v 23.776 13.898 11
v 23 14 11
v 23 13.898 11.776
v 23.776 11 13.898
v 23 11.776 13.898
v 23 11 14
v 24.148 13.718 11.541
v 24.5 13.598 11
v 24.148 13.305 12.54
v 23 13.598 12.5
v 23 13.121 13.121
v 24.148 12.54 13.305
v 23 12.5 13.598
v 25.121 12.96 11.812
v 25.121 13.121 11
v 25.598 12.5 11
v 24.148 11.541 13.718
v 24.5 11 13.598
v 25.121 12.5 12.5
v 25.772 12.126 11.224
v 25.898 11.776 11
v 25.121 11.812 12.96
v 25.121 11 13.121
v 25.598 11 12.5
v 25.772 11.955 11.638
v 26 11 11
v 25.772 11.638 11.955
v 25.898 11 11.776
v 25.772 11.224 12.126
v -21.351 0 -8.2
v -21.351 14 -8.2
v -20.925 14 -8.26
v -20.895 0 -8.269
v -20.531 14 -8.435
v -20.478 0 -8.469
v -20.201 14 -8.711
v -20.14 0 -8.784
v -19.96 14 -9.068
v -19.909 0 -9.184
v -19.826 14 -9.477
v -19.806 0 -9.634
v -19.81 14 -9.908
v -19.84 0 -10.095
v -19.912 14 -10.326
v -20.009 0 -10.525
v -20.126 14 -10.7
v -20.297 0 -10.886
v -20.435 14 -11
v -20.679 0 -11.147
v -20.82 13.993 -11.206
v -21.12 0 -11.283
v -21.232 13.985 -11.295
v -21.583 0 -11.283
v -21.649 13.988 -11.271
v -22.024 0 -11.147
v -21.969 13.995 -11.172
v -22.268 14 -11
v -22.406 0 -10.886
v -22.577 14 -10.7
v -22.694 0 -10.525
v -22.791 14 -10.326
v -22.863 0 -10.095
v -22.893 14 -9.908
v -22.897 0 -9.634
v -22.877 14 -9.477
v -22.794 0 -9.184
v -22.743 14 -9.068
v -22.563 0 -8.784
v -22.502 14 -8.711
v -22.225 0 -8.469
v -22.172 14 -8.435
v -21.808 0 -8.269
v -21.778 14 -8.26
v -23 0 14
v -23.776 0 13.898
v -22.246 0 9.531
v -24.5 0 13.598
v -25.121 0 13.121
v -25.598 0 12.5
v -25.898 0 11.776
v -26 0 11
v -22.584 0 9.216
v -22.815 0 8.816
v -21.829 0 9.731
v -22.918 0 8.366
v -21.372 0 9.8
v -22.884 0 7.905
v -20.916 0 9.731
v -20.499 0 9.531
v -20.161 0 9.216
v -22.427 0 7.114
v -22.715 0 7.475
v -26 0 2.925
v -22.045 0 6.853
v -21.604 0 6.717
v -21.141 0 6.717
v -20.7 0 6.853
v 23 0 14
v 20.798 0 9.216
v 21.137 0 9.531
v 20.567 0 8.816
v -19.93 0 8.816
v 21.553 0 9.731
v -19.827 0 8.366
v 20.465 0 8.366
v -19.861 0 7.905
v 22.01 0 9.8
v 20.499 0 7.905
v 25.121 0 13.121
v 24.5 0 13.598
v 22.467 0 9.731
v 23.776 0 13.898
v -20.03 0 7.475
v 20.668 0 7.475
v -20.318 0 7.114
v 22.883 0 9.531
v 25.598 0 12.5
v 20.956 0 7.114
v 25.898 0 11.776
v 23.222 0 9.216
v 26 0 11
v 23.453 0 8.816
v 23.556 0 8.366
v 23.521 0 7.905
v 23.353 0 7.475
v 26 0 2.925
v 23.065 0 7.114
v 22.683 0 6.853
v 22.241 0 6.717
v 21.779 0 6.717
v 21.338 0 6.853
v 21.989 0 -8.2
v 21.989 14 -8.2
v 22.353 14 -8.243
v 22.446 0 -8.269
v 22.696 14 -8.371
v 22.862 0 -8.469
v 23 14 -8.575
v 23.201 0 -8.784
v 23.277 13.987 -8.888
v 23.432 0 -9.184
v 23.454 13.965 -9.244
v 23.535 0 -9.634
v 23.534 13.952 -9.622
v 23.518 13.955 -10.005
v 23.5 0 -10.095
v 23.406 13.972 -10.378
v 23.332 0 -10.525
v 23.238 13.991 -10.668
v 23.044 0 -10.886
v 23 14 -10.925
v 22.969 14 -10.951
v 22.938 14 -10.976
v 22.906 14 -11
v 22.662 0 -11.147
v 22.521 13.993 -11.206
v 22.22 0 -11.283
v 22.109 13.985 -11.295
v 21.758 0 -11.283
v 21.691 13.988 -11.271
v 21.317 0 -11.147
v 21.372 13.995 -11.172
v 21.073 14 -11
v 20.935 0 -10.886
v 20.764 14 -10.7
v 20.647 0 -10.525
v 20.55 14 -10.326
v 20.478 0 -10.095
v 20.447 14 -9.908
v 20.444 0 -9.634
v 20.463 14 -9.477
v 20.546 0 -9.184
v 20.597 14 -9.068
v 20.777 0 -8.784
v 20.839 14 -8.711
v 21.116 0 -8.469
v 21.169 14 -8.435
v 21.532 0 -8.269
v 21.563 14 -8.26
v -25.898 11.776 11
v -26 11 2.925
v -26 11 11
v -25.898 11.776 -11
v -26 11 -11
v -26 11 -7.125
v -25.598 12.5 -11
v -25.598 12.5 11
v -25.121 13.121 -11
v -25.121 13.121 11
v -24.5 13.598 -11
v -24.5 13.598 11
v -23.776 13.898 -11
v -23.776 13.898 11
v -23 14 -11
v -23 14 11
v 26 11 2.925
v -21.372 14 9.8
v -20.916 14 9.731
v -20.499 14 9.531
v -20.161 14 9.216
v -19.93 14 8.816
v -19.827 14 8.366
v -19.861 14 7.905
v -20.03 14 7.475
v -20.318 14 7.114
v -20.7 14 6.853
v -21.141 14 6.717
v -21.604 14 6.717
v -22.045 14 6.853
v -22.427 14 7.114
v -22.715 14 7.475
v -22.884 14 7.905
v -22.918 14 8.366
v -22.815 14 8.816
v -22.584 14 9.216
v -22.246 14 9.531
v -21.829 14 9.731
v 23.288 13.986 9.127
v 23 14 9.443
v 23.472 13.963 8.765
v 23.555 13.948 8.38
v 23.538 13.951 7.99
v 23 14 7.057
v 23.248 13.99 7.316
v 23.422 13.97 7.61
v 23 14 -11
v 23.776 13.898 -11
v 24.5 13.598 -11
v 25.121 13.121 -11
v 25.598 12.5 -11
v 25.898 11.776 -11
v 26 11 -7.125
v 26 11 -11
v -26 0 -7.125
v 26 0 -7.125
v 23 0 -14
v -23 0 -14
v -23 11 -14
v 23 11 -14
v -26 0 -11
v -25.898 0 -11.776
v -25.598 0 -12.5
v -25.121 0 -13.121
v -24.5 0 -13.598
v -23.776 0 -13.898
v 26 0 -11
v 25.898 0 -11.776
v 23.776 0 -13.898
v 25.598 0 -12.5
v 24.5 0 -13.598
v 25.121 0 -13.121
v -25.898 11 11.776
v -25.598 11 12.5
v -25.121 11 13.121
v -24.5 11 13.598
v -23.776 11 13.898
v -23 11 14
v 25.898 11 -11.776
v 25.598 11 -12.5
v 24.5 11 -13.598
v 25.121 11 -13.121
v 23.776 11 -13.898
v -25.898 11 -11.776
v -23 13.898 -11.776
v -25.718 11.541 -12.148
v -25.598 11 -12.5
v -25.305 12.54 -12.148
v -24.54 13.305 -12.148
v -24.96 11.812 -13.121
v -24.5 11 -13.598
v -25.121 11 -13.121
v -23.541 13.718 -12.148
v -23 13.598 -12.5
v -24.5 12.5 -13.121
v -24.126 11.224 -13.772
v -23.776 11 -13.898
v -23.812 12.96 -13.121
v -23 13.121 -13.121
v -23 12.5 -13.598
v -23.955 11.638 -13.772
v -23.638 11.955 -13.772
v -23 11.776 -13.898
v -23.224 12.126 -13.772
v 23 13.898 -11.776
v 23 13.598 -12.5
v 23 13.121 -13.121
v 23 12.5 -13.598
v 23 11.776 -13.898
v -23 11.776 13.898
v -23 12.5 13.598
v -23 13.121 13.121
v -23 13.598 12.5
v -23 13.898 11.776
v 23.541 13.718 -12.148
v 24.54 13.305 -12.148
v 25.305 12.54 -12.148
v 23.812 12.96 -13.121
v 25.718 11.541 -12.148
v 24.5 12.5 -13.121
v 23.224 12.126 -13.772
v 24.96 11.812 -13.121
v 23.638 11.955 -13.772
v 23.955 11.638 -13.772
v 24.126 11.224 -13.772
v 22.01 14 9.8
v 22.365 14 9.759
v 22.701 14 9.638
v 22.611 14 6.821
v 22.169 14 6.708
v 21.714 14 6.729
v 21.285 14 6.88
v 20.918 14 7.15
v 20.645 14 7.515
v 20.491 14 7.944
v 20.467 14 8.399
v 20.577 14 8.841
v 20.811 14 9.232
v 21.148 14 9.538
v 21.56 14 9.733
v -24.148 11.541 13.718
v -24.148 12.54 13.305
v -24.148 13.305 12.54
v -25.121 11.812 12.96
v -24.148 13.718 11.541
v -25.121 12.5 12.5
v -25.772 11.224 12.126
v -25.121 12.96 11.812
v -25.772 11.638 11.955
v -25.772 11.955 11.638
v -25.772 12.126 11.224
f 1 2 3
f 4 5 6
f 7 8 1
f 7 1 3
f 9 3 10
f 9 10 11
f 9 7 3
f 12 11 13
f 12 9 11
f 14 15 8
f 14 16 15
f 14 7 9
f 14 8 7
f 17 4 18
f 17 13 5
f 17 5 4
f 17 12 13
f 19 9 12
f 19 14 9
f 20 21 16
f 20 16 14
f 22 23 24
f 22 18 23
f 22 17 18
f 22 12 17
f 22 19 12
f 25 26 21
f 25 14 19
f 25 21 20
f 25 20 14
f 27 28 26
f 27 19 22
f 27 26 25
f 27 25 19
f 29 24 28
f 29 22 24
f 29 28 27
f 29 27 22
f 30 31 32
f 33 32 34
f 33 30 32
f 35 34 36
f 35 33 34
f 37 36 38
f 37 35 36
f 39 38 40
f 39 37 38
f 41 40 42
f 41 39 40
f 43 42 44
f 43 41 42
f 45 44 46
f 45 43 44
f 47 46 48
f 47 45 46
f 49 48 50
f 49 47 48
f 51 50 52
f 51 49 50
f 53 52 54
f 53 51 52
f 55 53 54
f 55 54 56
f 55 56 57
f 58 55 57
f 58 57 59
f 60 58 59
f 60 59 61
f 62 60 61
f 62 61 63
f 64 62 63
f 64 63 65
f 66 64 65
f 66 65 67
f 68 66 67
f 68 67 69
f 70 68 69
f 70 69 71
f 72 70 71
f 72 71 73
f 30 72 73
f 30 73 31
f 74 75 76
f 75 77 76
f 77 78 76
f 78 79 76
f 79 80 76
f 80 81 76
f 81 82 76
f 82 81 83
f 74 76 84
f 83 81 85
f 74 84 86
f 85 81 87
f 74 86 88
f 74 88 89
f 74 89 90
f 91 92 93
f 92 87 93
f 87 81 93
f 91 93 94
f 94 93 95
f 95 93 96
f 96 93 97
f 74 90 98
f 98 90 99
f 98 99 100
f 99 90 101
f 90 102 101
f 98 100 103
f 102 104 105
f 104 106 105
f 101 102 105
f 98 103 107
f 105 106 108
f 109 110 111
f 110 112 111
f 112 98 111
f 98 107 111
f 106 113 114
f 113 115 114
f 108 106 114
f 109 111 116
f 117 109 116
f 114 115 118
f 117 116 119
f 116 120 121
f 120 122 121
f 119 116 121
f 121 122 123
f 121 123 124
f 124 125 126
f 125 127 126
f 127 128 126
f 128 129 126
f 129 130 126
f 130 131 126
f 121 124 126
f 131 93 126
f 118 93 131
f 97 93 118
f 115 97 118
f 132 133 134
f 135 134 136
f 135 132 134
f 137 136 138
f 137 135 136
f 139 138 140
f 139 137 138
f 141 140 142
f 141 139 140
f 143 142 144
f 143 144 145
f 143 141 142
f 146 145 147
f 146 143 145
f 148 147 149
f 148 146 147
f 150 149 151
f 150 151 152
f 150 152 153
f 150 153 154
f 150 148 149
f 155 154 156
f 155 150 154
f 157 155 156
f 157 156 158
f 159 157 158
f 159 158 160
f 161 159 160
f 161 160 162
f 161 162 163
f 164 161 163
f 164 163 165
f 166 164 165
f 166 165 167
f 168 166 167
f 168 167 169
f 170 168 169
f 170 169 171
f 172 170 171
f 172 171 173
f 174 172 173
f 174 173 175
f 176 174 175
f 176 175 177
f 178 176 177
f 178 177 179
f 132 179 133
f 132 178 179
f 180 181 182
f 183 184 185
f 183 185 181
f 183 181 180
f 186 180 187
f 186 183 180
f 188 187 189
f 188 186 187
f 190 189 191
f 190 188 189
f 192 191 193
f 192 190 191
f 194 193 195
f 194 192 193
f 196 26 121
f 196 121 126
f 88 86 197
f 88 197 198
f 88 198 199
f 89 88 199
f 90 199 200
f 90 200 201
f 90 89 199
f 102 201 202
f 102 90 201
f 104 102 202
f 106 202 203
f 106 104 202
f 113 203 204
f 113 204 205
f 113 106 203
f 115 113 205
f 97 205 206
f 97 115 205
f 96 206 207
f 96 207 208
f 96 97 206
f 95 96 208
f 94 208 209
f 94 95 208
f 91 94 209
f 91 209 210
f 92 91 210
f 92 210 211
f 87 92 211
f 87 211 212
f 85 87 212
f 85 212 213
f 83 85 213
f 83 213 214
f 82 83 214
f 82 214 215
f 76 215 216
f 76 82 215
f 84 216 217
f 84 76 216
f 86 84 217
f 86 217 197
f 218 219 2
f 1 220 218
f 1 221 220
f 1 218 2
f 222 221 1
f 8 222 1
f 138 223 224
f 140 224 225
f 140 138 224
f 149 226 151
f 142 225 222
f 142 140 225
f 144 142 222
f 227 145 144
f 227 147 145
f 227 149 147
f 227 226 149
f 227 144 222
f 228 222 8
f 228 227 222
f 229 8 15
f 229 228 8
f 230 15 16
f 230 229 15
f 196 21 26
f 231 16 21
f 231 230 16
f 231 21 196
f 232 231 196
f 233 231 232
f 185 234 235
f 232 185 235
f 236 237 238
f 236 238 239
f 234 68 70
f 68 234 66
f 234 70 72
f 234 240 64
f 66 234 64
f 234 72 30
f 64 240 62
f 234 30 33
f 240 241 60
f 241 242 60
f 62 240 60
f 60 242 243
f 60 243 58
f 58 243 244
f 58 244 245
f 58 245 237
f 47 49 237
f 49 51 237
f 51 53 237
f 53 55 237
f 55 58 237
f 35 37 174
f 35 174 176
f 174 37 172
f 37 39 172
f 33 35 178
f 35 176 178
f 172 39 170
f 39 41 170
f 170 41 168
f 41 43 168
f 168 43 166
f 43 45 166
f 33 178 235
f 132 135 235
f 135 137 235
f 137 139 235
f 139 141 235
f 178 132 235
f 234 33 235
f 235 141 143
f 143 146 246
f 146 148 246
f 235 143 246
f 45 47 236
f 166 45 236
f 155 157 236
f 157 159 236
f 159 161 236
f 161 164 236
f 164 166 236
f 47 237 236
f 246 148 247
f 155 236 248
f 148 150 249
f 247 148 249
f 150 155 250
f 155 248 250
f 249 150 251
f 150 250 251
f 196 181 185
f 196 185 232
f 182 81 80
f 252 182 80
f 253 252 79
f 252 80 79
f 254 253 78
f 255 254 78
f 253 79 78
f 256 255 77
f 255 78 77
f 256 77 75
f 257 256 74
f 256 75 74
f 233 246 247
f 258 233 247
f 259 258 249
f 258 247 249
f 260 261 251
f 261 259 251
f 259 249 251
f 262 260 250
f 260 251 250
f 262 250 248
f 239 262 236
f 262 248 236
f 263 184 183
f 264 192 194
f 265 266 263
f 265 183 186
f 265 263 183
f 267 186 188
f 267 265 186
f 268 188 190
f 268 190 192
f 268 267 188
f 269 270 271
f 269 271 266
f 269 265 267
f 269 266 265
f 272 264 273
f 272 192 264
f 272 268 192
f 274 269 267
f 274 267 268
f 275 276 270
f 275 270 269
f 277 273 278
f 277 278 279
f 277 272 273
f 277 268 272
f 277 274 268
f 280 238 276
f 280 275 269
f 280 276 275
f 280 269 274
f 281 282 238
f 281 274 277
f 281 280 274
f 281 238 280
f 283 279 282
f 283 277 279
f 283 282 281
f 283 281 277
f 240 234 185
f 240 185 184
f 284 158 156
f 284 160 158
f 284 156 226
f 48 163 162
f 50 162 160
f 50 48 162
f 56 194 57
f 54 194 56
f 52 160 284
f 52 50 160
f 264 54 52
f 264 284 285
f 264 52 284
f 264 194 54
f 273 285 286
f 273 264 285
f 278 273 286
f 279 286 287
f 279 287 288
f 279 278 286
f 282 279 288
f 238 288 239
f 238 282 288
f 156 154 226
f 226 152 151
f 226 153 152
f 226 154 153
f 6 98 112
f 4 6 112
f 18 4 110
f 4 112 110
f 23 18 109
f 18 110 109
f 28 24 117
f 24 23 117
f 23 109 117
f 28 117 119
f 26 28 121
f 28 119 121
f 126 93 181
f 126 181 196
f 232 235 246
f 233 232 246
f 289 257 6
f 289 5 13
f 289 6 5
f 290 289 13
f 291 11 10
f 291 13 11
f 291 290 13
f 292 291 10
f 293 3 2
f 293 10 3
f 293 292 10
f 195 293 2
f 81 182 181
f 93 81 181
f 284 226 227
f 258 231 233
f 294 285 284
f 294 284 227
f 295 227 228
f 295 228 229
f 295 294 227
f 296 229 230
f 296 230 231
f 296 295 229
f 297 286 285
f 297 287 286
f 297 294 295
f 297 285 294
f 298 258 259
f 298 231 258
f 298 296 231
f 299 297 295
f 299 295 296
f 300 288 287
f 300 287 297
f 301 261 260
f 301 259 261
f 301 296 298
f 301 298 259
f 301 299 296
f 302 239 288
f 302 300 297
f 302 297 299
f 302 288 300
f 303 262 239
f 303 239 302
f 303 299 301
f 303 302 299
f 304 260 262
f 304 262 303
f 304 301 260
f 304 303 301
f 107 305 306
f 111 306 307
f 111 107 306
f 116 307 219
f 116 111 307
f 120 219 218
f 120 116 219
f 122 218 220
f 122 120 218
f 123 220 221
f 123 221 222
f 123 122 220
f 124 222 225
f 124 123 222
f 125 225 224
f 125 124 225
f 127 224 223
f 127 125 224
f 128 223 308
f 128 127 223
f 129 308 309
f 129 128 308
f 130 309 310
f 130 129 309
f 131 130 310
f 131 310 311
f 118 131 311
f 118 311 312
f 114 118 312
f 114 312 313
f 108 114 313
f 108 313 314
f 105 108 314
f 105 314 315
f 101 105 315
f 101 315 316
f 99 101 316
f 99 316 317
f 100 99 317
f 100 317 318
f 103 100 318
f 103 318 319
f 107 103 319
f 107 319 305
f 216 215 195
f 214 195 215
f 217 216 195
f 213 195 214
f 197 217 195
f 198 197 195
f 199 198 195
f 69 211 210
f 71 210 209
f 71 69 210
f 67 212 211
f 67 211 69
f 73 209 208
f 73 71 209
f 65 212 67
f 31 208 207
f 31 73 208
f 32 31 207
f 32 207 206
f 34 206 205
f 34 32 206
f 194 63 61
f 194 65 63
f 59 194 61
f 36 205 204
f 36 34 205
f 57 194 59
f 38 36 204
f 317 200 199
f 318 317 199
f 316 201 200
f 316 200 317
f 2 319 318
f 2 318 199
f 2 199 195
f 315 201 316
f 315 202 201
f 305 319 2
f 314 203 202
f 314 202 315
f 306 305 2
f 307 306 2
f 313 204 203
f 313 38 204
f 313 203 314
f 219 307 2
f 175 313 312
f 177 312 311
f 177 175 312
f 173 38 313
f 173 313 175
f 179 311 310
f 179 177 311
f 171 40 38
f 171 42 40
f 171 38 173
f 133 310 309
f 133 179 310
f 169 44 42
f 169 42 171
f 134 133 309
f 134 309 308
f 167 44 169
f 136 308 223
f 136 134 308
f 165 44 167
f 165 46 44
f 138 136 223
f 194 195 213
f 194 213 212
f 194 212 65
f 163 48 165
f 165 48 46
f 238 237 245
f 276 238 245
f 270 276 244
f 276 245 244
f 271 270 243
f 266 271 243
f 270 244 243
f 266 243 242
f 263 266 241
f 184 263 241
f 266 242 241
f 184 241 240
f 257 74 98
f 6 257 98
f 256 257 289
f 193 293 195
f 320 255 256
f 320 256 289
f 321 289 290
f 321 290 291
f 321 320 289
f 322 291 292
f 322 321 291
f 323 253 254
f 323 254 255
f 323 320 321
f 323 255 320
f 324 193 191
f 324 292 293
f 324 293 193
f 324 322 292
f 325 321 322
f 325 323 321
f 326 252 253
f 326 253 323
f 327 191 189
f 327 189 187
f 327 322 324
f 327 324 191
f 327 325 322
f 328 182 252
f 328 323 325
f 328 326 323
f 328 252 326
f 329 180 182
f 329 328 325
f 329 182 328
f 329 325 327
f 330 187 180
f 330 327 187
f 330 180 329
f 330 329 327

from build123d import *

# Parameters (mm, degrees)
CROQUIS1_W              = 52
CROQUIS1_H              = 28
CROQUIS1_R              = 1.55
SALIENTE_EXTRUIR1_DEPTH = 14
CROQUIS2_W              = 62.635554568
CROQUIS2_H              = 10.05
CORTAR_EXTRUIR1_DEPTH   = 11
REDONDEO2_START         = -14
REDONDEO2_DEPTH         = 28
REDONDEO2_START_2       = -27
REDONDEO2_2_DEPTH       = 54
REDONDEO3_R             = 3


with BuildPart() as part:
    # Croquis1 → Saliente-Extruir1 (new body)
    with BuildSketch(Plane(origin=(0, 0, 0), x_dir=(1, 0, 0), z_dir=(0, 1, 0))):
        Rectangle(CROQUIS1_W, CROQUIS1_H)
        with Locations(Location((-21.372490304, -8.249987757, 0), (0, 0, 270))):
            Circle(CROQUIS1_R, mode=Mode.SUBTRACT)
        with Locations(Location((22.010248646, -8.249987757, 0), (0, 0, 270))):
            Circle(CROQUIS1_R, mode=Mode.SUBTRACT)
        with Locations(Location((-21.351495904, 9.75, 0), (0, 0, 270))):
            Circle(CROQUIS1_R, mode=Mode.SUBTRACT)
        with Locations(Location((21.989254247, 9.75, 0), (0, 0, 270))):
            Circle(CROQUIS1_R, mode=Mode.SUBTRACT)
    extrude(amount=SALIENTE_EXTRUIR1_DEPTH)

    # Croquis2 → Cortar-Extruir1 (cut)
    with BuildSketch(Plane.XZ):
        with Locations((0, -2.1)):
            Rectangle(CROQUIS2_W, CROQUIS2_H)
    extrude(amount=-CORTAR_EXTRUIR1_DEPTH, mode=Mode.SUBTRACT)

    # Redondeo2: read off the stored shape, not the designer's step
    # Redondeo2 outline → Redondeo2 (cut)
    with BuildSketch(Plane.XY.offset(REDONDEO2_START)):
        with BuildLine():
            ThreePointArc((-26, 11), (-25.121320344, 13.121320344), (-23, 14))
            Line((-23, 14), (-26, 14))
            Line((-26, 14), (-26, 11))
        make_face()
        with BuildLine():
            ThreePointArc((23, 14), (25.121320344, 13.121320344), (26, 11))
            Line((26, 11), (26, 14))
            Line((26, 14), (23, 14))
        make_face()
    extrude(amount=REDONDEO2_DEPTH, mode=Mode.SUBTRACT)

    # Redondeo2 2 outline → Redondeo2 2 (cut)
    with BuildSketch(Plane.YZ.offset(REDONDEO2_START_2)):
        with BuildLine():
            ThreePointArc((11, 14), (13.121320344, 13.121320344), (14, 11))
            Line((14, 11), (14, 14))
            Line((14, 14), (11, 14))
        make_face()
        with BuildLine():
            ThreePointArc((14, -11), (13.121320344, -13.121320344), (11, -14))
            Line((11, -14), (14, -14))
            Line((14, -14), (14, -11))
        make_face()
    extrude(amount=REDONDEO2_2_DEPTH, mode=Mode.SUBTRACT)

    # Redondeo3
    # the kernel refuses this fillet: 3 mm, written as the material it takes off along each edge
    with BuildSketch(Plane(origin=(23, 11, -11), x_dir=(1, 0, 0), z_dir=(0, 0, -1))) as redondeo3_piece_1_section:
        Polygon((0, 0), (REDONDEO3_R, 0), (REDONDEO3_R, -REDONDEO3_R), (0, -REDONDEO3_R), align=None)
    redondeo3_piece_1 = extrude(amount=REDONDEO3_R, mode=Mode.PRIVATE)
    redondeo3_piece_1 = redondeo3_piece_1 - Plane(origin=(23, 11, -11), x_dir=(-0.7071067811865475, -0.7071067811865475, 0), z_dir=(0, 0, -1)) * Sphere(REDONDEO3_R, mode=Mode.PRIVATE)
    add(redondeo3_piece_1, mode=Mode.SUBTRACT)
    with BuildSketch(Plane(origin=(23, 11, 11), x_dir=(0, 0, 1), z_dir=(1, 0, 0))) as redondeo3_piece_2_section:
        Polygon((0, 0), (REDONDEO3_R, 0), (REDONDEO3_R, -REDONDEO3_R), (0, -REDONDEO3_R), align=None)
    redondeo3_piece_2 = extrude(amount=REDONDEO3_R, mode=Mode.PRIVATE)
    redondeo3_piece_2 = redondeo3_piece_2 - Plane(origin=(23, 11, 11), x_dir=(0, -0.7071067811865475, -0.7071067811865475), z_dir=(1, 0, 0)) * Sphere(REDONDEO3_R, mode=Mode.PRIVATE)
    add(redondeo3_piece_2, mode=Mode.SUBTRACT)
    with BuildSketch(Plane(origin=(-23, 11, -11), x_dir=(-1, 0, 0), z_dir=(0, 0, -1))) as redondeo3_piece_3_section:
        Polygon((0, 0), (REDONDEO3_R, 0), (REDONDEO3_R, REDONDEO3_R), (0, REDONDEO3_R), align=None)
    redondeo3_piece_3 = extrude(amount=REDONDEO3_R, mode=Mode.PRIVATE)
    redondeo3_piece_3 = redondeo3_piece_3 - Plane(origin=(-23, 11, -11), x_dir=(0.7071067811865475, -0.7071067811865475, 0), z_dir=(0, 0, -1)) * Sphere(REDONDEO3_R, mode=Mode.PRIVATE)
    add(redondeo3_piece_3, mode=Mode.SUBTRACT)
    with BuildSketch(Plane(origin=(-23, 11, 11), x_dir=(0, 0, 1), z_dir=(-1, 0, 0))) as redondeo3_piece_4_section:
        Polygon((0, 0), (REDONDEO3_R, 0), (REDONDEO3_R, REDONDEO3_R), (0, REDONDEO3_R), align=None)
    redondeo3_piece_4 = extrude(amount=REDONDEO3_R, mode=Mode.PRIVATE)
    redondeo3_piece_4 = redondeo3_piece_4 - Plane(origin=(-23, 11, 11), x_dir=(0, -0.7071067811865475, -0.7071067811865475), z_dir=(-1, 0, 0)) * Sphere(REDONDEO3_R, mode=Mode.PRIVATE)
    add(redondeo3_piece_4, mode=Mode.SUBTRACT)
    with BuildSketch(Plane(origin=(-26, -7.5, 14), x_dir=(0, 0, -1), z_dir=(0, 1, 0)), Plane(origin=(-26, -7.5, -14), x_dir=(1, 0, 0), z_dir=(0, 1, 0))) as redondeo3_piece_5:
        with BuildLine():
            CenterArc((REDONDEO3_R, -REDONDEO3_R), REDONDEO3_R, 90, 90)
            Line((0, -REDONDEO3_R), (0, 0))
            Line((0, 0), (REDONDEO3_R, 0))
        make_face()
    extrude(amount=18.5, mode=Mode.SUBTRACT)
    with BuildSketch(Plane(origin=(26, -7.5, -14), x_dir=(-1, 0, 0), z_dir=(0, 1, 0)), Plane(origin=(26, -7.5, 14), x_dir=(0, 0, -1), z_dir=(0, 1, 0))) as redondeo3_piece_6:
        with BuildLine():
            CenterArc((REDONDEO3_R, REDONDEO3_R), REDONDEO3_R, 180, 90)
            Line((0, REDONDEO3_R), (0, 0))
            Line((0, 0), (REDONDEO3_R, 0))
        make_face()
    extrude(amount=18.5, mode=Mode.SUBTRACT)


solid = part.part
